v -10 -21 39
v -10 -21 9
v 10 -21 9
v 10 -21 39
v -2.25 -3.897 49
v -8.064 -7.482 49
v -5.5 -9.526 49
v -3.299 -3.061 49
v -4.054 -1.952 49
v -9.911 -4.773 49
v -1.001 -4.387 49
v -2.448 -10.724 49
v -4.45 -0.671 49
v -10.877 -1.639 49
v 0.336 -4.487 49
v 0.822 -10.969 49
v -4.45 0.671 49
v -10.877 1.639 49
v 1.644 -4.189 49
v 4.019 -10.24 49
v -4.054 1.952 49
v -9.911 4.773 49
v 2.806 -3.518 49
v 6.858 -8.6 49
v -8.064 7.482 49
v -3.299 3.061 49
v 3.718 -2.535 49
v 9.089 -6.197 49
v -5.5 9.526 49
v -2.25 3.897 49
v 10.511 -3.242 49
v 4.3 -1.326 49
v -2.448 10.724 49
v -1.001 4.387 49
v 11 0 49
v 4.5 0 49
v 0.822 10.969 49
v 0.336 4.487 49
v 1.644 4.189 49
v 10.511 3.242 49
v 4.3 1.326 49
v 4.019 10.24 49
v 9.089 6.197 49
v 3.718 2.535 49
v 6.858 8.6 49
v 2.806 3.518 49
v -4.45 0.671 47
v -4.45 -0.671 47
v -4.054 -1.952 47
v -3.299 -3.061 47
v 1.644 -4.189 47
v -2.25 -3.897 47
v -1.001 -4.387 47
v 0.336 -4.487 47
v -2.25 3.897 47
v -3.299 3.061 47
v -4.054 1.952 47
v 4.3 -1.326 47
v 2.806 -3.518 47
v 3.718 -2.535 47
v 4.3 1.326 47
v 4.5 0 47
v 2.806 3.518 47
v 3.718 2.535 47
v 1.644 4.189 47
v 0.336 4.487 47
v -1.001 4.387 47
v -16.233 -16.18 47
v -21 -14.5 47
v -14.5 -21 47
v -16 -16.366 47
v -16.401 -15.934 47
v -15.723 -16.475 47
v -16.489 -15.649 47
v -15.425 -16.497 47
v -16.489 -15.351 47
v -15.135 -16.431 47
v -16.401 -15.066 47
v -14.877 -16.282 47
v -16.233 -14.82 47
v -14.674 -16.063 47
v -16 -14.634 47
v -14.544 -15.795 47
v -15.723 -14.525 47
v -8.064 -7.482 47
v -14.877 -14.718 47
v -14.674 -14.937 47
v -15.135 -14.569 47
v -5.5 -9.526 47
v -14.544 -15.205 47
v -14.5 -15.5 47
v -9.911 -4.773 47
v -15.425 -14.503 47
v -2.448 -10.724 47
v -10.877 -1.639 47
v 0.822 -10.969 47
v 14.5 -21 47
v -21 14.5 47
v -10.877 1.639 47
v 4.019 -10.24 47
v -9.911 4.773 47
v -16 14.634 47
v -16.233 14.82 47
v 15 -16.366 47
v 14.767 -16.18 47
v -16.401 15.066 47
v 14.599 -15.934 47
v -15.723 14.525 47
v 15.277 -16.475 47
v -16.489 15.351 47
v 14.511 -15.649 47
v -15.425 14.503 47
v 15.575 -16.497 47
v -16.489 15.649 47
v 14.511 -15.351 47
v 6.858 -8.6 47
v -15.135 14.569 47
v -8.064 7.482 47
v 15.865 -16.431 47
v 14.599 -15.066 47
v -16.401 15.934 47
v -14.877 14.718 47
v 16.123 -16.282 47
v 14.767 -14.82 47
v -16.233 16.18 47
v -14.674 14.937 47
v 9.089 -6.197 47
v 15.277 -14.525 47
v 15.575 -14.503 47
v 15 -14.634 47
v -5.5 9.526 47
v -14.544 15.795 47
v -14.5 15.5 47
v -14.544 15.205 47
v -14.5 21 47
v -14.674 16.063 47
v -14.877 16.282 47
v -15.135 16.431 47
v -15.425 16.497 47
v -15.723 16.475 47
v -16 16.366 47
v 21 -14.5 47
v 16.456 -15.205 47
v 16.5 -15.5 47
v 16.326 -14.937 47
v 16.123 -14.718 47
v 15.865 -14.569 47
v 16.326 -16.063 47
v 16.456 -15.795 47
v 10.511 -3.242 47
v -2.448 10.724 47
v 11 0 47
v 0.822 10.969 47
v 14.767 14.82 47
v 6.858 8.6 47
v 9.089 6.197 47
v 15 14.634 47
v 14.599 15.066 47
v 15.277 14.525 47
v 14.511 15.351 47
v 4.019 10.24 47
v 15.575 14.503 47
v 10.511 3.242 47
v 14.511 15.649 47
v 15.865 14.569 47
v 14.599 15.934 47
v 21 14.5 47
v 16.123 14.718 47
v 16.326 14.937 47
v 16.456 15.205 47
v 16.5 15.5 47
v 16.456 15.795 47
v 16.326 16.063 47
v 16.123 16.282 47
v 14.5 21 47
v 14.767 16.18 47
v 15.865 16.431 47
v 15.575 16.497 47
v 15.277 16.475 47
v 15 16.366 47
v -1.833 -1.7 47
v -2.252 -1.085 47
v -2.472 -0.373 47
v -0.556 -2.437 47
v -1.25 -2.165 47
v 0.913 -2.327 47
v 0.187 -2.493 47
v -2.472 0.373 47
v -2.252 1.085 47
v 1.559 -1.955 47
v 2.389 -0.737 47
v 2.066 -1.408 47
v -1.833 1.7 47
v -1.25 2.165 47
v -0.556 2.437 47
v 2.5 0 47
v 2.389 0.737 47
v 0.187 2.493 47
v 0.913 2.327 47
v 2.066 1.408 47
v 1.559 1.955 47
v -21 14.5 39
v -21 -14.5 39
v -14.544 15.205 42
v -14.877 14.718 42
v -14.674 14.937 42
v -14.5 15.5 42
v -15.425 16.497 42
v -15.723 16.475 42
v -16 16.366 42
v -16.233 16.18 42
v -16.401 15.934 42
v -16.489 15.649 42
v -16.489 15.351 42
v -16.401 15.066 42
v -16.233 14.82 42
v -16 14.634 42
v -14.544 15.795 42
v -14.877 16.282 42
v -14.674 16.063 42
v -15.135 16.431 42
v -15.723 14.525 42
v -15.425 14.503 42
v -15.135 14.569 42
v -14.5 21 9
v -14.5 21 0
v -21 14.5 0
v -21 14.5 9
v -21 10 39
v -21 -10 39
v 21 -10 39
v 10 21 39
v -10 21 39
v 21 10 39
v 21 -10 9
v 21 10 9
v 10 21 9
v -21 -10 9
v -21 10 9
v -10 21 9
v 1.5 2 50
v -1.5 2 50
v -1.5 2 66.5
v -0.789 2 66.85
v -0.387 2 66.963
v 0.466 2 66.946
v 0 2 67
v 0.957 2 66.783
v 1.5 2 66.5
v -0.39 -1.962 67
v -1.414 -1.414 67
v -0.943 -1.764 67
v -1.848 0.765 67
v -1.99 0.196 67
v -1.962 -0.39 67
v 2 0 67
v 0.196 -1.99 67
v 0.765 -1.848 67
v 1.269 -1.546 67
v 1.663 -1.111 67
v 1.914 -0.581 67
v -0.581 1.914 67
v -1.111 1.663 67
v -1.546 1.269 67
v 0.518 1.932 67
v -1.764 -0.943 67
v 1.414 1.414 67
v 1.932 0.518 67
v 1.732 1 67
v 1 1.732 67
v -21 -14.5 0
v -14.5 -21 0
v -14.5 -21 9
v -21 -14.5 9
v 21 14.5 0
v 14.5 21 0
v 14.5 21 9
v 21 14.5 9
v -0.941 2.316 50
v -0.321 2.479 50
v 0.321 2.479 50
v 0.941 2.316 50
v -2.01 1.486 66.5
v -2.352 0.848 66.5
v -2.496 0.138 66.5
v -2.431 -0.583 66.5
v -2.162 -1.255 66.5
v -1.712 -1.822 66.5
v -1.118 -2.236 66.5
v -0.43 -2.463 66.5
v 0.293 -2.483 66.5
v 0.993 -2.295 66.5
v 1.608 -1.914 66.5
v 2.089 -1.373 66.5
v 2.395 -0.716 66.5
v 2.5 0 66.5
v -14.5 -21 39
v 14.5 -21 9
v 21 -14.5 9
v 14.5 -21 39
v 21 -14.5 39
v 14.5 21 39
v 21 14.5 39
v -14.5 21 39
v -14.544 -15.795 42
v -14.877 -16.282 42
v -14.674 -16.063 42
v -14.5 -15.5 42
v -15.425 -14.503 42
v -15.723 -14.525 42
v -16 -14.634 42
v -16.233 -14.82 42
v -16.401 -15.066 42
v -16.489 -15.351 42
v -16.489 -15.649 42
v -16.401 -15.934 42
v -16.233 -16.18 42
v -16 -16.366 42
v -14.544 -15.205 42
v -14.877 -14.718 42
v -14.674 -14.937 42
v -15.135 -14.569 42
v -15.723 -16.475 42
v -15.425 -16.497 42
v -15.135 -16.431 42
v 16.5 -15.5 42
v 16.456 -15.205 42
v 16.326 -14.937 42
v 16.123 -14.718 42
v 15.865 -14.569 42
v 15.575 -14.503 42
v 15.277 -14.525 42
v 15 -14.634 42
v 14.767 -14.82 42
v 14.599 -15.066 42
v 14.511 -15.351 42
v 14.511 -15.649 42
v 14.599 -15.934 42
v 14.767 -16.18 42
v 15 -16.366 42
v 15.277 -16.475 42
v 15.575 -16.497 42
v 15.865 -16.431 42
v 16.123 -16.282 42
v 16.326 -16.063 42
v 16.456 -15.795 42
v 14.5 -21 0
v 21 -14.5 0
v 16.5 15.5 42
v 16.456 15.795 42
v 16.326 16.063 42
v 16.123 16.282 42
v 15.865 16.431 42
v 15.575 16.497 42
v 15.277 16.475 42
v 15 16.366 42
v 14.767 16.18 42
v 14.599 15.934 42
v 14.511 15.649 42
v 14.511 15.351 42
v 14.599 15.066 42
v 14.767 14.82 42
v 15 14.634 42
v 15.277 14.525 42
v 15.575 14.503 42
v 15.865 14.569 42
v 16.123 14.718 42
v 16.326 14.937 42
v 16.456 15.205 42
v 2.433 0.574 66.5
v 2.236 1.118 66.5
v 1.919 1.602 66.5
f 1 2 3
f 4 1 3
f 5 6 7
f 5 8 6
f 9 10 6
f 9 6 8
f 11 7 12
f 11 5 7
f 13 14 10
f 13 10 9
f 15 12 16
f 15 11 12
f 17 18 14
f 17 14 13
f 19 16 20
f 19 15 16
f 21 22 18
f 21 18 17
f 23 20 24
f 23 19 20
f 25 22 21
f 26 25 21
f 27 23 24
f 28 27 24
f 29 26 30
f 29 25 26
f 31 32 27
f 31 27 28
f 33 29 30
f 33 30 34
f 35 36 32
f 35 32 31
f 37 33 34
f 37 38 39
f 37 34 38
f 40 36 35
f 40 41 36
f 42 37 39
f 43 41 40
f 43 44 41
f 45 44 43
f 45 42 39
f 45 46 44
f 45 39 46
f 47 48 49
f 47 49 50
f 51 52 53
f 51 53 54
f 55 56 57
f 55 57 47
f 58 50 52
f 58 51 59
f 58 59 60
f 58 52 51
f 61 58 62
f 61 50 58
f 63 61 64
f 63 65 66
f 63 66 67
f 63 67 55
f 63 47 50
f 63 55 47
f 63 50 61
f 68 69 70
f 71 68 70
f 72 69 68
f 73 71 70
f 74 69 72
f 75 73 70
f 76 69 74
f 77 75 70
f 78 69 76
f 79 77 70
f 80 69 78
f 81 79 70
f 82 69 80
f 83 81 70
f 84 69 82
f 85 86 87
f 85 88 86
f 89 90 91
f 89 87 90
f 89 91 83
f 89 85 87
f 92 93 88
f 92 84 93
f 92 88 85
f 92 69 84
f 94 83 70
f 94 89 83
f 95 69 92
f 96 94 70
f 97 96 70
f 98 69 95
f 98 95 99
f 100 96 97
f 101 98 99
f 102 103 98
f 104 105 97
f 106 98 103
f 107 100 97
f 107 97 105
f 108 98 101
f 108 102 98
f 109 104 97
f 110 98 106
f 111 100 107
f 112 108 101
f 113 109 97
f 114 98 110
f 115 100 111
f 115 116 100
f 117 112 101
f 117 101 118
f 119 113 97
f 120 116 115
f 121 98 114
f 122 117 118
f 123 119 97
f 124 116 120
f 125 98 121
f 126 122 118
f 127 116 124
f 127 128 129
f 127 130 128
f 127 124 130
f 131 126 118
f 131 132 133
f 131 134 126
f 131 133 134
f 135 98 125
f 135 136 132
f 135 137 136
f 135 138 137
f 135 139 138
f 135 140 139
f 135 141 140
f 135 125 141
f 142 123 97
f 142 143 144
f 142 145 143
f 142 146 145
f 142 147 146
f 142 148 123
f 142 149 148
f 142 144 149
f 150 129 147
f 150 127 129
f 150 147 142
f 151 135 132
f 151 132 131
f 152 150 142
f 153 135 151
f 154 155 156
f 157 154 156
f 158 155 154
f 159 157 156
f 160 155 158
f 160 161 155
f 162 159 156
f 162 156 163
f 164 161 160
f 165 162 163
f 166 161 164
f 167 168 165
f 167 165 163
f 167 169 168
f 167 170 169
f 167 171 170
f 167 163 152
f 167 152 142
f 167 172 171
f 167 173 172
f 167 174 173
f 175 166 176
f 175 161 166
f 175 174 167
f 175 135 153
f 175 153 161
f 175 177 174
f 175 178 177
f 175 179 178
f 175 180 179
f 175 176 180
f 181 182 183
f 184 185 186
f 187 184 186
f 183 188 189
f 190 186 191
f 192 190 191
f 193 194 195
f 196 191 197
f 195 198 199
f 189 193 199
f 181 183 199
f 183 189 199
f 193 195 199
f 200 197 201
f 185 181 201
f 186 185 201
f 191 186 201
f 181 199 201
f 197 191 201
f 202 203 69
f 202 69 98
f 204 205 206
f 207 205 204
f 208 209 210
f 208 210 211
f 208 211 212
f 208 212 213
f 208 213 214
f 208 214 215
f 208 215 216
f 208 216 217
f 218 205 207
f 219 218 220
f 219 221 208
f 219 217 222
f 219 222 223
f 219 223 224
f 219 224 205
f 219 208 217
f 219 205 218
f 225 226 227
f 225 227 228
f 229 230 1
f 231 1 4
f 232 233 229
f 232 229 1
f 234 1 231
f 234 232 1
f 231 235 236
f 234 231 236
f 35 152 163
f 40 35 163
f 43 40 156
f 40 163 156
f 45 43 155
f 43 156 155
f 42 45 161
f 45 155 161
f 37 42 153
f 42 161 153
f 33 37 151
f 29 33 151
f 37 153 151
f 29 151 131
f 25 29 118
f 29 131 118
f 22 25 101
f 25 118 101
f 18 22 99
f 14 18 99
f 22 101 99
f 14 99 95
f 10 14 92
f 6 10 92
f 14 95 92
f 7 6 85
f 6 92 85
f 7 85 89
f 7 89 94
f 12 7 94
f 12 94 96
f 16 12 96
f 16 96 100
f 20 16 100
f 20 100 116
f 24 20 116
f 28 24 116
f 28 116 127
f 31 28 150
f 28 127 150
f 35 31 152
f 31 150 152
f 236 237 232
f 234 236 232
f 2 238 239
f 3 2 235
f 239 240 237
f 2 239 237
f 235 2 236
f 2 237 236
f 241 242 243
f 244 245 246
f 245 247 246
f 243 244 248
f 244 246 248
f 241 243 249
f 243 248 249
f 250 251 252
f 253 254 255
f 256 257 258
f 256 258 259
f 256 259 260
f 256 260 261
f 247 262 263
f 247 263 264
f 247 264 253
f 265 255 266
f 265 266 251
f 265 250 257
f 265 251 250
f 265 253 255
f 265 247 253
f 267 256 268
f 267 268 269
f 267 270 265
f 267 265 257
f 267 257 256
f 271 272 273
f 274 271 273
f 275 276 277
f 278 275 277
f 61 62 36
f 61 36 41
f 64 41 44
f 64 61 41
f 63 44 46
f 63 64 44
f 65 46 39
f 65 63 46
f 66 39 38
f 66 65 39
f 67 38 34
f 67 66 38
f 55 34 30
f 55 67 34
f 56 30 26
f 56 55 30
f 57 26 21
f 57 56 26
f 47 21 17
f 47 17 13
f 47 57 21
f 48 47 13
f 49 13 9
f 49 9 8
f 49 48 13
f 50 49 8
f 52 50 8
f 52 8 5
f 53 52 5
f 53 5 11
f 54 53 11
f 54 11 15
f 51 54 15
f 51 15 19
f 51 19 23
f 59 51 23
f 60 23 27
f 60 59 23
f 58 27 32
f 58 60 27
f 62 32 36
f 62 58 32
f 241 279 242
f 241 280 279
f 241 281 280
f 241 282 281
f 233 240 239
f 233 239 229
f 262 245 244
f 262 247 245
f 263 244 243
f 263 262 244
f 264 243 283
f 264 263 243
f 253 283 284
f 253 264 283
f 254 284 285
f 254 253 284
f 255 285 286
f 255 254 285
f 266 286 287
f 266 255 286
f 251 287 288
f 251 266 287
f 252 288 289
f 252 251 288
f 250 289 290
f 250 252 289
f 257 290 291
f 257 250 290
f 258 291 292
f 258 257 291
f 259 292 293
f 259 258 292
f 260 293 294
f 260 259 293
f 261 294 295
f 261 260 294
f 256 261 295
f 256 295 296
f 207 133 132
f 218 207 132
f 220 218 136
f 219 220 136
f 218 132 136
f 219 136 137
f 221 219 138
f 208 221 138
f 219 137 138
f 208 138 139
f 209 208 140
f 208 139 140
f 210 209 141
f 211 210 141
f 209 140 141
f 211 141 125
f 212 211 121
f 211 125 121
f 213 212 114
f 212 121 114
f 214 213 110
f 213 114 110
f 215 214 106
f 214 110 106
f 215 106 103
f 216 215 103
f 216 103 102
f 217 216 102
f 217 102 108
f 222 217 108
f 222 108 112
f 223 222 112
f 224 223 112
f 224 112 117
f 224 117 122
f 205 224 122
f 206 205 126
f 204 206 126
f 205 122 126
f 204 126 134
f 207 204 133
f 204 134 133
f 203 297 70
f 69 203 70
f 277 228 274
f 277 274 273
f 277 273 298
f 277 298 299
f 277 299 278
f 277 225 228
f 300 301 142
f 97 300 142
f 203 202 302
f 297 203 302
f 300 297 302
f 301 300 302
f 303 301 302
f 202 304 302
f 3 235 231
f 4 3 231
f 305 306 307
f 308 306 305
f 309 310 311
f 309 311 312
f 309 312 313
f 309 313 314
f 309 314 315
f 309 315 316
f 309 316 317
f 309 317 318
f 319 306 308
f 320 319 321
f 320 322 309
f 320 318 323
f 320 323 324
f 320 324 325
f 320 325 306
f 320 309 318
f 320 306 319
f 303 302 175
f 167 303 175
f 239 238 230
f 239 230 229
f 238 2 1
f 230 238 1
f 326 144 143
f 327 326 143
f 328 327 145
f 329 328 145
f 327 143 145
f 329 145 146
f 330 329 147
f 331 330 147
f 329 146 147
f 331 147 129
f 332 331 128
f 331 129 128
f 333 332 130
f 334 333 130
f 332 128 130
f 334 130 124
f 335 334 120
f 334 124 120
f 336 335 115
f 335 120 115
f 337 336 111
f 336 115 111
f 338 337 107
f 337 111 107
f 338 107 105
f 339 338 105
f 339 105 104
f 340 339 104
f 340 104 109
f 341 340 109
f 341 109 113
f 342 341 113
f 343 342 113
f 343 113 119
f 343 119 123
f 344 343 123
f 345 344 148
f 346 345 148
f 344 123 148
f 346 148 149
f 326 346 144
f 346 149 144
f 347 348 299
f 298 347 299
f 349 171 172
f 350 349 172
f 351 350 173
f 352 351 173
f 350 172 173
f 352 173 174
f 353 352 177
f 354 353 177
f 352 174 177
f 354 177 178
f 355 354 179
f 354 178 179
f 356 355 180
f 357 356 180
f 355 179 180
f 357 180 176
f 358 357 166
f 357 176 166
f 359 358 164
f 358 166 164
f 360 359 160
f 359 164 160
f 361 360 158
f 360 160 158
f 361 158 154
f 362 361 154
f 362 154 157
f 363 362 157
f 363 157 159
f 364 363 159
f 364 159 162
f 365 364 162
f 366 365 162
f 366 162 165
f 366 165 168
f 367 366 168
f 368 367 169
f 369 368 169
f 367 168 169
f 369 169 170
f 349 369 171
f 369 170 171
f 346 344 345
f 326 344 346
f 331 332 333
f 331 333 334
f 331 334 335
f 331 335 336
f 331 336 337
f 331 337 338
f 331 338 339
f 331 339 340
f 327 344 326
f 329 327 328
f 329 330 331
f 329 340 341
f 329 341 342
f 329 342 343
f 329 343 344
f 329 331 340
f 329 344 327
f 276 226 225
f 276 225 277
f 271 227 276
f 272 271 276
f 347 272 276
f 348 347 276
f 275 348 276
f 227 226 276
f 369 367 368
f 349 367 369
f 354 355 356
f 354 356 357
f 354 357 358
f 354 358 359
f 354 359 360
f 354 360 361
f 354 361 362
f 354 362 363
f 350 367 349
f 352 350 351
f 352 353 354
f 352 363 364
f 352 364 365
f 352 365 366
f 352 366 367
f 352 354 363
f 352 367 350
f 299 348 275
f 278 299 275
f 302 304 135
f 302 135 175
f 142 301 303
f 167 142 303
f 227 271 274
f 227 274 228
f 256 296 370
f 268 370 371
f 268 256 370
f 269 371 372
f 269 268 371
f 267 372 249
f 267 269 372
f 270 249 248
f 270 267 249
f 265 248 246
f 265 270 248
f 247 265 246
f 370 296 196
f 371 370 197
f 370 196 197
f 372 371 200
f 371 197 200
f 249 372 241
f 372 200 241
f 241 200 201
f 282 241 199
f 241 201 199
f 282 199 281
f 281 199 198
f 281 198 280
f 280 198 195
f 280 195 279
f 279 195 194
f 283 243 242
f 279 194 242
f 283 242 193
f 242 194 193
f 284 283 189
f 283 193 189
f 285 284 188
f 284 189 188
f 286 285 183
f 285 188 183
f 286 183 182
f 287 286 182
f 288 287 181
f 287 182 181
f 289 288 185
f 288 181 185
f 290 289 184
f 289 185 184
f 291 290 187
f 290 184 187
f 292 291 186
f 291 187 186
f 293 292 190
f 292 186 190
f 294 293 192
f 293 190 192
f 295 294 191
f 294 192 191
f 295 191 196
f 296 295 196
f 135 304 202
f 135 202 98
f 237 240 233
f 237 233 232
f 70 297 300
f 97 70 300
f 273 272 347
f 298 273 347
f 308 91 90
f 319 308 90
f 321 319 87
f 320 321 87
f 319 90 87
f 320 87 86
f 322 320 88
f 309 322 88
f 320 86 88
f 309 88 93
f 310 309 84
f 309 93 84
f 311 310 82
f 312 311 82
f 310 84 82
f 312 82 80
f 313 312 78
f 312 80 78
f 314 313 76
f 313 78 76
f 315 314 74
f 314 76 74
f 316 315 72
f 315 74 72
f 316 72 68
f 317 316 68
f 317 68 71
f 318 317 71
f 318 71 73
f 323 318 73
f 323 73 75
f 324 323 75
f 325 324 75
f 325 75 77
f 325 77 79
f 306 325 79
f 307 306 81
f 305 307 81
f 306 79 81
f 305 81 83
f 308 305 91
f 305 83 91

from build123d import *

# Parameters (mm, degrees)
F0_W      = 42
F0_H      = 42
F1_DEPTH  = 9
F2_SIZE   = 6.5
F3_W      = 42
F3_H      = 42
F4_DEPTH  = 30
F5_SIZE   = 11
F6_W      = 42
F6_H      = 42
F7_DEPTH  = 8
F8_SIZE   = 6.5
F9_R      = 11
F9_R_2    = 4.5
F10_DEPTH = 2
F11_R     = 2.5
F12_DEPTH = 20
F13_SIZE  = 0.5
F14_W     = 6
F14_H     = 1
F15_DEPTH = 18
F16_R     = 1
F17_DEPTH = 5
F18_DEPTH = 17


with BuildPart() as f1:
    # F0 (on Top) → F1 (new body)
    with BuildSketch(Plane.XY):
        Rectangle(F0_W, F0_H)
    extrude(amount=F1_DEPTH)

    # F2
    f2_edges = [f1.edges().sort_by_distance(p)[0] for p in [
        (-21, -21, 4.5),
        (21, -21, 4.5),
        (21, 21, 4.5),
        (-21, 21, 4.5),
    ]]
    chamfer(f2_edges, length=F2_SIZE)

    # F14 (on face) → F15 (cut)
    with BuildSketch(Plane.XY.offset(67)):
        with Locations((0, 2.5)):
            Rectangle(F14_W, F14_H)
    extrude(amount=F15_DEPTH, mode=Mode.SUBTRACT)


with BuildPart() as f4:
    # F3 (on face) → F4 (new body)
    with BuildSketch(Plane.XY.offset(9)):
        Rectangle(F3_W, F3_H)
    extrude(amount=F4_DEPTH)

    # F5
    f5_edges = [f4.edges().sort_by_distance(p)[0] for p in [
        (21, 21, 24),
        (-21, 21, 24),
        (-21, -21, 24),
        (21, -21, 24),
    ]]
    chamfer(f5_edges, length=F5_SIZE)


with BuildPart() as f7:
    # F6 (on face) → F7 (new body)
    with BuildSketch(Plane.XY.offset(39)):
        Rectangle(F6_W, F6_H)
    extrude(amount=F7_DEPTH)

    # F8
    f8_edges = [f7.edges().sort_by_distance(p)[0] for p in [
        (-21, -21, 43),
        (21, -21, 43),
        (21, 21, 43),
        (-21, 21, 43),
    ]]
    chamfer(f8_edges, length=F8_SIZE)

    # F9 (on face) → F10 (join)
    with BuildSketch(Plane.XY.offset(47)):
        Circle(F9_R)
        Circle(F9_R_2, mode=Mode.SUBTRACT)
    extrude(amount=F10_DEPTH)

    # F16 (on face) → F17 (cut)
    with BuildSketch(Plane.XY.offset(47)):
        with Locations((-15.5, 15.5)):
            Circle(F16_R)
        with Locations((15.5, 15.5)):
            Circle(F16_R)
        with Locations((-15.5, -15.5)):
            Circle(F16_R)
        with Locations((15.5, -15.5)):
            Circle(F16_R)
    extrude(amount=-F17_DEPTH, mode=Mode.SUBTRACT)


with BuildPart() as f12:
    # F11 (on face) → F12 (new body)
    with BuildSketch(Plane.XY.offset(47)):
        Circle(F11_R)
    extrude(amount=F12_DEPTH)

    # F13
    f13_edges = [f12.edges().sort_by_distance(p)[0] for p in [
        (-2.5, 0, 67),
    ]]
    chamfer(f13_edges, length=F13_SIZE)

    # F14 (on face) → F18 (cut)
    with BuildSketch(Plane.XY.offset(67)):
        with Locations((0, 2.5)):
            Rectangle(F14_W, F14_H)
    extrude(amount=-F18_DEPTH, mode=Mode.SUBTRACT)


solid = Compound([f1.part, f4.part, f7.part, f12.part])
